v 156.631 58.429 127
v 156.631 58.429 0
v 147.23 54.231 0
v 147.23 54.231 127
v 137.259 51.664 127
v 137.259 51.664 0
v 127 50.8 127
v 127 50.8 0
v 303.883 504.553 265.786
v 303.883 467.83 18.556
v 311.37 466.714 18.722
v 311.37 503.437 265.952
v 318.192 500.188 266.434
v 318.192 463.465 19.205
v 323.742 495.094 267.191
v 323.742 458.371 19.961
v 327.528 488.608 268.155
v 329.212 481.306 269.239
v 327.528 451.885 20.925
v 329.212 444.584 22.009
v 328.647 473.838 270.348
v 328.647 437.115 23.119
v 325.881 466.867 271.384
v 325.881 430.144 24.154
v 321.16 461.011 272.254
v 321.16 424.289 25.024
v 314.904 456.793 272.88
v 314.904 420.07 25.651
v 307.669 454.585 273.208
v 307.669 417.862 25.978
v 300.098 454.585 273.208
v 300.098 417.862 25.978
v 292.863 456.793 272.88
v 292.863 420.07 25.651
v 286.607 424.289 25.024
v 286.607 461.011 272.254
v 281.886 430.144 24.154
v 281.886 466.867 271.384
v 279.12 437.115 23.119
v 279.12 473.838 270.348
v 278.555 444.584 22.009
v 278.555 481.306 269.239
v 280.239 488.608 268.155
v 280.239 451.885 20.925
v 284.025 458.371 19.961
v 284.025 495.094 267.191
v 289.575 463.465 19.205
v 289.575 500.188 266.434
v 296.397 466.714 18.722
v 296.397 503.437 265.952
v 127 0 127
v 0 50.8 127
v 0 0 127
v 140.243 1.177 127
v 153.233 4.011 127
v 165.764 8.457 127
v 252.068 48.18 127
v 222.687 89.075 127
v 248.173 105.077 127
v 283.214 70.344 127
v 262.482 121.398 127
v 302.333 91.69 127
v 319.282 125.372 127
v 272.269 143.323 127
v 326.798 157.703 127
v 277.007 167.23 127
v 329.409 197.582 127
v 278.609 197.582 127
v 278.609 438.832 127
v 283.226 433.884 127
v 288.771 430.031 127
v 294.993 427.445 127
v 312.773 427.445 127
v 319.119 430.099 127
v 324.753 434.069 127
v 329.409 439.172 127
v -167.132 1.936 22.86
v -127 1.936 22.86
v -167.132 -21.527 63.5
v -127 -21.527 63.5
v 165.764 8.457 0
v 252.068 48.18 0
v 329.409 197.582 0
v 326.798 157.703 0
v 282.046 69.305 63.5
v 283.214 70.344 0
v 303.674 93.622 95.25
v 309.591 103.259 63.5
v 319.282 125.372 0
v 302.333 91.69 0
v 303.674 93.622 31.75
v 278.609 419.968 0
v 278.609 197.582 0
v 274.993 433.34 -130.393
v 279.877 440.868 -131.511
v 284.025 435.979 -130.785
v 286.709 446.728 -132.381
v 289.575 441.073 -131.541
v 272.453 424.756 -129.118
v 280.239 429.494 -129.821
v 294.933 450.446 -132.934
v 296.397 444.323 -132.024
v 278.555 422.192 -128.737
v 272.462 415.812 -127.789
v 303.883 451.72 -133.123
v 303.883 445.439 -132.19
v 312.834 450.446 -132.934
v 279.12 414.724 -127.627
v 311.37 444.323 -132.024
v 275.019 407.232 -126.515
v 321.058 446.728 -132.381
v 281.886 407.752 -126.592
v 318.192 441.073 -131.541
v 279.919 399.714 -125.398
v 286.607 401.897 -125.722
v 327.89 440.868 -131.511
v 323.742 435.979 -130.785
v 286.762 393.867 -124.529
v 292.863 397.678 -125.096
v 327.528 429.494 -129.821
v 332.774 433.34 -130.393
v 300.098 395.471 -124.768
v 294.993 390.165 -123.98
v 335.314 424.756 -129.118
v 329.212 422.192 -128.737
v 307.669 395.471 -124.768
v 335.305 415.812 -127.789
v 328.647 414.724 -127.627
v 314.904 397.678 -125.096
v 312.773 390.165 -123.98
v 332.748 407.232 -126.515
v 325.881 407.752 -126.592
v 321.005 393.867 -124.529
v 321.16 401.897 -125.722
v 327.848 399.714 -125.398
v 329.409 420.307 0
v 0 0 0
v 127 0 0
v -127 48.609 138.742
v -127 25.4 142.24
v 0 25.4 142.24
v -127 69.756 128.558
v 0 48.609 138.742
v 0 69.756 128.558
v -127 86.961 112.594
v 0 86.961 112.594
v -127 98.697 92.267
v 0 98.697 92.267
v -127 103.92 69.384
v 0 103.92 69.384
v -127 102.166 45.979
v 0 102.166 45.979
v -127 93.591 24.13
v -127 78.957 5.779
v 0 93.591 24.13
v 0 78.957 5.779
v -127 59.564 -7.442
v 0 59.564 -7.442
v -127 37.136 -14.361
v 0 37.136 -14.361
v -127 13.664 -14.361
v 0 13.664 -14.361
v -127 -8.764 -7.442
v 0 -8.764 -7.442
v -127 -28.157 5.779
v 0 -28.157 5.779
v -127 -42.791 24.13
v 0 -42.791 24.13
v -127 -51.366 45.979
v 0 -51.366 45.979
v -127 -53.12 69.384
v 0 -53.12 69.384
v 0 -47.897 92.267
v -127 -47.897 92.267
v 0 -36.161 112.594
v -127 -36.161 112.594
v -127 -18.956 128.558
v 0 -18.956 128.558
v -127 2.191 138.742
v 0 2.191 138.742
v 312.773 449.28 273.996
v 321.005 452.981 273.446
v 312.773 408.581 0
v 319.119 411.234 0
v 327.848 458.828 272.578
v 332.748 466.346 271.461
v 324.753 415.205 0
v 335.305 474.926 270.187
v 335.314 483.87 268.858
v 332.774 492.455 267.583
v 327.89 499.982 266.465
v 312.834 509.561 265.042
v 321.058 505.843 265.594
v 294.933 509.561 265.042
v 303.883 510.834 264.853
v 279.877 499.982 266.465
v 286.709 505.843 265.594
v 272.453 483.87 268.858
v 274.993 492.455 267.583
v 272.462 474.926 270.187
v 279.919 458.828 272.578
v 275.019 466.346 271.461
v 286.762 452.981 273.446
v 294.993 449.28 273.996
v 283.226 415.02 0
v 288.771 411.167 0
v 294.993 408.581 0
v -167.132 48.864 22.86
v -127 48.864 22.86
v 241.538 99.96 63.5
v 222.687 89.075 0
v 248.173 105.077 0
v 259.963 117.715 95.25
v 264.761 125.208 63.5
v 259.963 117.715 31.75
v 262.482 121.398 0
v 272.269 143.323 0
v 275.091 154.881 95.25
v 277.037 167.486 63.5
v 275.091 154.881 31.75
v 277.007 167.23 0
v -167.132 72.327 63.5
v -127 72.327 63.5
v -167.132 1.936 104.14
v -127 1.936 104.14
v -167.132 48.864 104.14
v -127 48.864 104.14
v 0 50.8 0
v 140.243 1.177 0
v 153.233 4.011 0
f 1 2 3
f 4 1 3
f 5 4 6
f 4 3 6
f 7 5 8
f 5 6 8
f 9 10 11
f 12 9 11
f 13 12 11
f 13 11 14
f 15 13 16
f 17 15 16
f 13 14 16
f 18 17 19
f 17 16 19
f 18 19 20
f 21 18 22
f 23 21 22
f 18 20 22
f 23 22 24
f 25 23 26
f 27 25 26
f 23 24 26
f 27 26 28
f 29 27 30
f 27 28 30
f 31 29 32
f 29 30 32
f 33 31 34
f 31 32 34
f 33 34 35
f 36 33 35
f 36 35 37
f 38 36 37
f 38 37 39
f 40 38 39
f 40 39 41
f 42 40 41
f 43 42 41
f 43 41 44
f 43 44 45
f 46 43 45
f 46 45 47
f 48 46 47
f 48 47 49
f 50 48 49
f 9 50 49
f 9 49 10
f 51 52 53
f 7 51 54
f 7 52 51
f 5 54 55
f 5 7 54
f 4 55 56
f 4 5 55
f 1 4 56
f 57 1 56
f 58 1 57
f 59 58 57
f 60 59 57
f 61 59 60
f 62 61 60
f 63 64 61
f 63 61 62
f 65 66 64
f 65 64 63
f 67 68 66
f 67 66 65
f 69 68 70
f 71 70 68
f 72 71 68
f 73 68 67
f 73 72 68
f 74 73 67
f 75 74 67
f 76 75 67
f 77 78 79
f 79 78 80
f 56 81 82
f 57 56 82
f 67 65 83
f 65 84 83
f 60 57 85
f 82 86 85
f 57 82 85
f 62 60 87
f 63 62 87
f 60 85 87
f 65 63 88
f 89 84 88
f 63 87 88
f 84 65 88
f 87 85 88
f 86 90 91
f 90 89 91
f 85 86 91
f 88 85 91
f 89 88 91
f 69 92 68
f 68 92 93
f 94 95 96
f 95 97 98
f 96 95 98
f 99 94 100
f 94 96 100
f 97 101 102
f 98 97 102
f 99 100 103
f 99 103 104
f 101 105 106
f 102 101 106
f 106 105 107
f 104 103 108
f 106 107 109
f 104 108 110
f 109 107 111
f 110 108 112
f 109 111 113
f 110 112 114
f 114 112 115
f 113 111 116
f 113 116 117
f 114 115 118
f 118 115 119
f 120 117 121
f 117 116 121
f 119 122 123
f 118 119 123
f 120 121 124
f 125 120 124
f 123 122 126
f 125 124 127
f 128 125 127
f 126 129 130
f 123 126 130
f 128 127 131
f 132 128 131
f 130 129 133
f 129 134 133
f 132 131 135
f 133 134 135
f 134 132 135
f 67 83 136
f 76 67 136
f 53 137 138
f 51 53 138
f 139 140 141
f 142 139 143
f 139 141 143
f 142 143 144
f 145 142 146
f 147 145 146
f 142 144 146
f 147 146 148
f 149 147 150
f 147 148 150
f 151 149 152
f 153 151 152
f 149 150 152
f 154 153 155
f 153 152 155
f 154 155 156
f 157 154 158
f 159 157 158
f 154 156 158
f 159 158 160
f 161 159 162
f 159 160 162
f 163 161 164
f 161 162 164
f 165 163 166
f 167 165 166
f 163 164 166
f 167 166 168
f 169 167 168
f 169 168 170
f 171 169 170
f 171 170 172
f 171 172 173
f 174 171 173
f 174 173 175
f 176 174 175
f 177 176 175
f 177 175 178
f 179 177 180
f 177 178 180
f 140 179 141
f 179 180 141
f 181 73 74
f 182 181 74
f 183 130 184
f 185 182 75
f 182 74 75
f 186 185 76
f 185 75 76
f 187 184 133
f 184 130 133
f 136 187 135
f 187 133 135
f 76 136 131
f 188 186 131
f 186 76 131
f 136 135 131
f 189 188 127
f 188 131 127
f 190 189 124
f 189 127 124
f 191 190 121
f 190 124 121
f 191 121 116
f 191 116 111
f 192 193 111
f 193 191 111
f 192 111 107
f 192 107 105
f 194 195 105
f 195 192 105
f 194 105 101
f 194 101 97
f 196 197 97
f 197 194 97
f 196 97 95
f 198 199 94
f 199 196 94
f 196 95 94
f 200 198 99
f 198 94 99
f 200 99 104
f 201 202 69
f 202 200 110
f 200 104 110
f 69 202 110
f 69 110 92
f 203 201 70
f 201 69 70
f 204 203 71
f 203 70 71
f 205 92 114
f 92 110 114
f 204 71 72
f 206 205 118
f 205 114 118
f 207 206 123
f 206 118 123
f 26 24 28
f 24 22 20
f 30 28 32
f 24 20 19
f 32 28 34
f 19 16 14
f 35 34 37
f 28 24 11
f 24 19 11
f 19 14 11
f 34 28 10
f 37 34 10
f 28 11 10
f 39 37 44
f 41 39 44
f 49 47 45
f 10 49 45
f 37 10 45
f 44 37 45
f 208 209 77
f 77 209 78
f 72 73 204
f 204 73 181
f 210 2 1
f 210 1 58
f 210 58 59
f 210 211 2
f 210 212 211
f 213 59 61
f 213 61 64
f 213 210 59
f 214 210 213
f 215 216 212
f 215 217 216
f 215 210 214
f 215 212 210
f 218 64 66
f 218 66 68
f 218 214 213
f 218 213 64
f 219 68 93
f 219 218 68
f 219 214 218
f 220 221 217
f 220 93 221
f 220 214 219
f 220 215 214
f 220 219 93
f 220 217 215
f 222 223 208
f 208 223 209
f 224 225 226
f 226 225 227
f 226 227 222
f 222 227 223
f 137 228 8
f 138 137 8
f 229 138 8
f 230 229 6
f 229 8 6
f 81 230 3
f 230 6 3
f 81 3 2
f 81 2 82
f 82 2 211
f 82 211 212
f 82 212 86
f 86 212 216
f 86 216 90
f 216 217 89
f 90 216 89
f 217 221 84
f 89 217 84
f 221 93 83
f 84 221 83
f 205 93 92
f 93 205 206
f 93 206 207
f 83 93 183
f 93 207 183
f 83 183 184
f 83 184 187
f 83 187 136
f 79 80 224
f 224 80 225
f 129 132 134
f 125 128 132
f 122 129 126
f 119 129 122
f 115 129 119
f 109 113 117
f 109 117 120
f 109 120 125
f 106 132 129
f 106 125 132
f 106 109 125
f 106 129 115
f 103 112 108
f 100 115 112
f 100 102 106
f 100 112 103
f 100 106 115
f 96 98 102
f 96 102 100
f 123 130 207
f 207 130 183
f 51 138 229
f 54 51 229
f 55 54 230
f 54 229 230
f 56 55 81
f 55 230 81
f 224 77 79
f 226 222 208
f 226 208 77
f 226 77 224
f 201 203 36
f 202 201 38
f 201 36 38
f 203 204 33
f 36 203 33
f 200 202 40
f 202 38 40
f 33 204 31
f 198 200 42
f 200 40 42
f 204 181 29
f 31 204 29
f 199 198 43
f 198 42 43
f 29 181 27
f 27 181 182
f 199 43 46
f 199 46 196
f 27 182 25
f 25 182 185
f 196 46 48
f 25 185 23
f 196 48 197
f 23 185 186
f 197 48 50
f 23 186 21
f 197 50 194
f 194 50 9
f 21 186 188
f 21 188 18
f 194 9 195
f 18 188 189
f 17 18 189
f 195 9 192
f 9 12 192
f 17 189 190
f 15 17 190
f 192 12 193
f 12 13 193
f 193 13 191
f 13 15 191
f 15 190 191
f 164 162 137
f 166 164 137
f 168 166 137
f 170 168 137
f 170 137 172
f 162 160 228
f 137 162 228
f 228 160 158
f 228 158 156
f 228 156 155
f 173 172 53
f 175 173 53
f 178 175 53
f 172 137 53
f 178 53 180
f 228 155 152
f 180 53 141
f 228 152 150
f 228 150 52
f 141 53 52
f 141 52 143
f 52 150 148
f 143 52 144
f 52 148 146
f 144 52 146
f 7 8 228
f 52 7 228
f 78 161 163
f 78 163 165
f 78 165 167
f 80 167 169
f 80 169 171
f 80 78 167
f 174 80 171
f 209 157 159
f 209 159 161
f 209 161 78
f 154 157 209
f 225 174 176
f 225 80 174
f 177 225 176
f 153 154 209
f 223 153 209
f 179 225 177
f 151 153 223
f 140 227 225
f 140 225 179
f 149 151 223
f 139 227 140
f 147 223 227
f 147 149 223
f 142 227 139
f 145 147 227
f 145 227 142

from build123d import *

# Parameters (mm, degrees)
BOSS_EXTRUDE1_DEPTH      = 127
SKETCH2_R                = 78.74
BOSS_EXTRUDE2_DEPTH      = 127
BOSS_EXTRUDE3_DEPTH      = 40.132
BOSS_EXTRUDE4_DEPTH      = 12.7
BOSS_EXTRUDE4_DEPTH_BACK = 63.5
CUT_EXTRUDE4_DEPTH       = 719.599431417
SKETCH7_R                = 25.4
CUT_EXTRUDE5_DEPTH       = 304.8
BOSS_EXTRUDE5_DEPTH      = 50.8
SKETCH9_R                = 25.4
CUT_EXTRUDE6_DEPTH       = 706.793572447
SKETCH10_R               = 28.426883493
BOSS_EXTRUDE6_DEPTH      = 152.4


with BuildPart() as part:
    # Sketch1 → Boss-Extrude1 (new body)
    with BuildSketch(Plane.XY):
        with BuildLine():
            Line((0, 0), (127, 0))
            ThreePointArc((127, 0), (146.783062772, 2.389452828), (165.763803889, 8.456620544))
            add(Edge.make_bspline(
                [(165.763803889, 8.456620544), (215.95075425, 29.910933142), (293.749967936, 60.02479605), (329.40949352, 131.409080947), (329.40949352, 197.581697377)],
                knots=[0, 0, 0, 0, 0.489737158, 1, 1, 1, 1], degree=3))
            Line((329.40949352, 197.581697377), (329.40949352, 431.8))
            Line((329.40949352, 431.8), (278.60949352, 431.8))
            Line((278.60949352, 431.8), (278.60949352, 197.581697377))
            add(Edge.make_bspline(
                [(156.630652755, 58.428868346), (189.028044031, 76.295644753), (253.765909659, 94.018996051), (278.60949352, 141.969854777), (278.60949352, 197.581697377)],
                knots=[0, 0, 0, 0, 0.475110131, 1, 1, 1, 1], degree=3))
            ThreePointArc((156.630652755, 58.428868346), (142.298490244, 52.737817604), (127, 50.8))
            Line((127, 50.8), (0, 50.8))
            Line((0, 50.8), (0, 0))
        make_face()
    extrude(amount=BOSS_EXTRUDE1_DEPTH)

    # Sketch2 → Boss-Extrude2 (add)
    with BuildSketch(Plane.ZY):
        with Locations((63.5, 25.4)):
            Circle(SKETCH2_R)
    extrude(amount=BOSS_EXTRUDE2_DEPTH)

    # Sketch3 → Boss-Extrude3 (add)
    with BuildSketch(Plane.ZY.offset(127)):
        Polygon((63.5, 72.32702988), (22.86, 48.86351494), (22.86, 1.93648506), (63.5, -21.52702988), (104.14, 1.93648506), (104.14, 48.86351494), align=None)
    extrude(amount=BOSS_EXTRUDE3_DEPTH)

    # Sketch4 → Boss-Extrude4 (add, two sides: drawn at the far end of the back side and taken through both)
    with BuildSketch(Plane.ZY.offset(-278.60949352).offset(-BOSS_EXTRUDE4_DEPTH_BACK)):
        Polygon((-123.979561218, 390.165409655), (273.996216856, 449.279655757), (262.901002007, 523.976146929), (-135.074776066, 464.861900827), align=None)
    extrude(amount=BOSS_EXTRUDE4_DEPTH + BOSS_EXTRUDE4_DEPTH_BACK)

    # Sketch6 → Cut-Extrude4 (cut, through all)
    with BuildSketch(Plane(origin=(0, -9.595531889, -64.600151761), x_dir=(-1, 0, 0), z_dir=(0, -0.14692530866024317, -0.9891475894299558))):
        with BuildLine():
            Line((-342.10949352, 404.146909738), (-312.773498747, 404.146909738))
            ThreePointArc((-312.773498747, 404.146909738), (-322.933498747, 460.026909738), (-272.133498747, 434.626909738))
            ThreePointArc((-272.133498747, 434.626909738), (-278.483498747, 415.576909738), (-294.993498747, 404.146909738))
            Line((-294.993498747, 404.146909738), (-265.90949352, 404.146909738))
            Line((-265.90949352, 404.146909738), (-265.90949352, 479.662931787))
            Line((-265.90949352, 479.662931787), (-342.10949352, 479.662931787))
            Line((-342.10949352, 479.662931787), (-342.10949352, 404.146909738))
        make_face()
    extrude(amount=-CUT_EXTRUDE4_DEPTH, mode=Mode.SUBTRACT)

    # Sketch7 → Cut-Extrude5 (cut)
    with BuildSketch(Plane(origin=(0, -9.595531889, -64.600151761), x_dir=(-1, 0, 0), z_dir=(0, -0.14692530866024317, -0.9891475894299558))):
        with Locations(Location((-303.883498747, 434.626909738, 0), (0, 0, 90))):
            Circle(SKETCH7_R)
    extrude(amount=-CUT_EXTRUDE5_DEPTH, mode=Mode.SUBTRACT)

    # Sketch8 → Boss-Extrude5 (add)
    with BuildSketch(Plane.ZY.offset(-278.60949352)):
        Polygon((0, 400.877395826), (0, 426.277395826), (127, 445.141632467), (127, 419.741632467), align=None)
    extrude(amount=-BOSS_EXTRUDE5_DEPTH)

    # Sketch9 → Cut-Extrude6 (cut, through all)
    with BuildSketch(Plane(origin=(0, -9.595531889, -64.600151761), x_dir=(-1, 0, 0), z_dir=(0, -0.14692530866024317, -0.9891475894299558))):
        with Locations(Location((-303.883498747, 434.626909738, 0), (0, 0, 90))):
            Circle(SKETCH9_R)
    extrude(amount=-CUT_EXTRUDE6_DEPTH, mode=Mode.SUBTRACT)

    # Sketch10 → Boss-Extrude6 (add)
    with BuildSketch(Plane(origin=(0, -9.595531889, -64.600151761), x_dir=(-1, 0, 0), z_dir=(0, -0.14692530866024317, -0.9891475894299558))):
        with Locations((-303.883498747, 434.626909738)):
            Circle(SKETCH10_R)
    extrude(amount=-BOSS_EXTRUDE6_DEPTH)


solid = part.part
